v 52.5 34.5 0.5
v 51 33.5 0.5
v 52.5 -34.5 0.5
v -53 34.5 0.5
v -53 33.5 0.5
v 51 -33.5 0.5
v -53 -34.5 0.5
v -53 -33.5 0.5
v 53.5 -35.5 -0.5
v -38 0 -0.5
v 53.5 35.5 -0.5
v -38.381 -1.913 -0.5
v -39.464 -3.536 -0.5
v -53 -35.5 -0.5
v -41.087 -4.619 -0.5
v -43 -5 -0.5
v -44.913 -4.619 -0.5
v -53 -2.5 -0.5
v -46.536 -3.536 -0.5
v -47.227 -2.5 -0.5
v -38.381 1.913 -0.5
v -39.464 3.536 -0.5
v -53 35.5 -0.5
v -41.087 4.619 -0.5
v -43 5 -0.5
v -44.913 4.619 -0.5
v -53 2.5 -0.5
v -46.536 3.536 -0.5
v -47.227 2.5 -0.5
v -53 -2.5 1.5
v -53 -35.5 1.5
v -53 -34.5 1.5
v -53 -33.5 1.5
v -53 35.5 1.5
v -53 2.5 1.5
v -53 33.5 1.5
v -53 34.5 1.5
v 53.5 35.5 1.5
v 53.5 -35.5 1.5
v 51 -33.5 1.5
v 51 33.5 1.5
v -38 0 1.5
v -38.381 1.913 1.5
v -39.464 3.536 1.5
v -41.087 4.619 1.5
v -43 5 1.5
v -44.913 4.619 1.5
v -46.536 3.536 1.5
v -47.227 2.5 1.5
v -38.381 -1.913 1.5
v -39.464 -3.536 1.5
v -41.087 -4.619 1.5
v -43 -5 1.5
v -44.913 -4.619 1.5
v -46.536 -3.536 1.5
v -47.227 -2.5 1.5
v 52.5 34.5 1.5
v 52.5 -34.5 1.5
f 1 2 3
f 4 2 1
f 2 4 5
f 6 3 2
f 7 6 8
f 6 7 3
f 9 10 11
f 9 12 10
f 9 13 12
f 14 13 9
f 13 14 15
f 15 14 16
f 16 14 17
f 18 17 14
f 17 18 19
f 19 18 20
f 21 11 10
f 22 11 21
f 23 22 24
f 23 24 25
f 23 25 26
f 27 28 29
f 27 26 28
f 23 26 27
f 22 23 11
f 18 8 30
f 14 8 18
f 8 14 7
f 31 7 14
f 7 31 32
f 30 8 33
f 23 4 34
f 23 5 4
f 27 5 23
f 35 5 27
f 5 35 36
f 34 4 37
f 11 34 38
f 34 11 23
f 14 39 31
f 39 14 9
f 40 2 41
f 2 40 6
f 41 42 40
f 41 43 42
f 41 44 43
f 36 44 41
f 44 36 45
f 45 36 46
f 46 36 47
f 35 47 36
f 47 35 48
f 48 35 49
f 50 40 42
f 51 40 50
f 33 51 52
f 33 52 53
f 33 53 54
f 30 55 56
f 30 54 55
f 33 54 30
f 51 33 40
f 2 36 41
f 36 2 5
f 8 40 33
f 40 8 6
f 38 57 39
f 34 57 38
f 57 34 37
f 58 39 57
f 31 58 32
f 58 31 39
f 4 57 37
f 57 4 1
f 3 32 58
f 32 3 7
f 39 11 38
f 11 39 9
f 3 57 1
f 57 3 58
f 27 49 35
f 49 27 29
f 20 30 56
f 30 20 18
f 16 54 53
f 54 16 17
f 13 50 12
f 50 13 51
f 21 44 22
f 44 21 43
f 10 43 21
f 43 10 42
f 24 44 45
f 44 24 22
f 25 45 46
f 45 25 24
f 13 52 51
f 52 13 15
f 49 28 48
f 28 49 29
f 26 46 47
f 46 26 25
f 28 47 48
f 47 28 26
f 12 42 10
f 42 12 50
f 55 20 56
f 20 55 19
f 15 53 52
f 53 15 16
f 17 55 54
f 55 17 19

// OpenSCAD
// file: piece-2-socle-2.scad
module socle2() {
    cube([106,71,1],center=true);
    translate([-1,0,0.5]) {cube([104,67,2],center=true);};
    translate([0,35,0.5]) {cube([106,1,2],center=true);};
    translate([0,-35,0.5]) {cube([106,1,2],center=true);};
    translate([53,0,0.5]) {cube([1,71,2],center=true);};
}
// file: piece-1-socle-1.scad
module socle1() {
    cube([106,71,1],center=true);
    translate([0,0,0.5]) {cube([106,67,2],center=true);};
    translate([0,35,0.5]) {cube([106,1,2],center=true);};
    translate([0,-35,0.5]) {cube([106,1,2],center=true);};
    translate([53,0,0.5]) { 
        cube([15,5,2],center=true);
        translate([10,0,0]) {
            cylinder(h=2,r=5,center=true);
        }
    };
}
// main file
include <piece-1-socle-1.scad>;
include <piece-2-socle-2.scad>;
difference(){
    socle2();
    translate([-106,0,0]){socle1();}
}
